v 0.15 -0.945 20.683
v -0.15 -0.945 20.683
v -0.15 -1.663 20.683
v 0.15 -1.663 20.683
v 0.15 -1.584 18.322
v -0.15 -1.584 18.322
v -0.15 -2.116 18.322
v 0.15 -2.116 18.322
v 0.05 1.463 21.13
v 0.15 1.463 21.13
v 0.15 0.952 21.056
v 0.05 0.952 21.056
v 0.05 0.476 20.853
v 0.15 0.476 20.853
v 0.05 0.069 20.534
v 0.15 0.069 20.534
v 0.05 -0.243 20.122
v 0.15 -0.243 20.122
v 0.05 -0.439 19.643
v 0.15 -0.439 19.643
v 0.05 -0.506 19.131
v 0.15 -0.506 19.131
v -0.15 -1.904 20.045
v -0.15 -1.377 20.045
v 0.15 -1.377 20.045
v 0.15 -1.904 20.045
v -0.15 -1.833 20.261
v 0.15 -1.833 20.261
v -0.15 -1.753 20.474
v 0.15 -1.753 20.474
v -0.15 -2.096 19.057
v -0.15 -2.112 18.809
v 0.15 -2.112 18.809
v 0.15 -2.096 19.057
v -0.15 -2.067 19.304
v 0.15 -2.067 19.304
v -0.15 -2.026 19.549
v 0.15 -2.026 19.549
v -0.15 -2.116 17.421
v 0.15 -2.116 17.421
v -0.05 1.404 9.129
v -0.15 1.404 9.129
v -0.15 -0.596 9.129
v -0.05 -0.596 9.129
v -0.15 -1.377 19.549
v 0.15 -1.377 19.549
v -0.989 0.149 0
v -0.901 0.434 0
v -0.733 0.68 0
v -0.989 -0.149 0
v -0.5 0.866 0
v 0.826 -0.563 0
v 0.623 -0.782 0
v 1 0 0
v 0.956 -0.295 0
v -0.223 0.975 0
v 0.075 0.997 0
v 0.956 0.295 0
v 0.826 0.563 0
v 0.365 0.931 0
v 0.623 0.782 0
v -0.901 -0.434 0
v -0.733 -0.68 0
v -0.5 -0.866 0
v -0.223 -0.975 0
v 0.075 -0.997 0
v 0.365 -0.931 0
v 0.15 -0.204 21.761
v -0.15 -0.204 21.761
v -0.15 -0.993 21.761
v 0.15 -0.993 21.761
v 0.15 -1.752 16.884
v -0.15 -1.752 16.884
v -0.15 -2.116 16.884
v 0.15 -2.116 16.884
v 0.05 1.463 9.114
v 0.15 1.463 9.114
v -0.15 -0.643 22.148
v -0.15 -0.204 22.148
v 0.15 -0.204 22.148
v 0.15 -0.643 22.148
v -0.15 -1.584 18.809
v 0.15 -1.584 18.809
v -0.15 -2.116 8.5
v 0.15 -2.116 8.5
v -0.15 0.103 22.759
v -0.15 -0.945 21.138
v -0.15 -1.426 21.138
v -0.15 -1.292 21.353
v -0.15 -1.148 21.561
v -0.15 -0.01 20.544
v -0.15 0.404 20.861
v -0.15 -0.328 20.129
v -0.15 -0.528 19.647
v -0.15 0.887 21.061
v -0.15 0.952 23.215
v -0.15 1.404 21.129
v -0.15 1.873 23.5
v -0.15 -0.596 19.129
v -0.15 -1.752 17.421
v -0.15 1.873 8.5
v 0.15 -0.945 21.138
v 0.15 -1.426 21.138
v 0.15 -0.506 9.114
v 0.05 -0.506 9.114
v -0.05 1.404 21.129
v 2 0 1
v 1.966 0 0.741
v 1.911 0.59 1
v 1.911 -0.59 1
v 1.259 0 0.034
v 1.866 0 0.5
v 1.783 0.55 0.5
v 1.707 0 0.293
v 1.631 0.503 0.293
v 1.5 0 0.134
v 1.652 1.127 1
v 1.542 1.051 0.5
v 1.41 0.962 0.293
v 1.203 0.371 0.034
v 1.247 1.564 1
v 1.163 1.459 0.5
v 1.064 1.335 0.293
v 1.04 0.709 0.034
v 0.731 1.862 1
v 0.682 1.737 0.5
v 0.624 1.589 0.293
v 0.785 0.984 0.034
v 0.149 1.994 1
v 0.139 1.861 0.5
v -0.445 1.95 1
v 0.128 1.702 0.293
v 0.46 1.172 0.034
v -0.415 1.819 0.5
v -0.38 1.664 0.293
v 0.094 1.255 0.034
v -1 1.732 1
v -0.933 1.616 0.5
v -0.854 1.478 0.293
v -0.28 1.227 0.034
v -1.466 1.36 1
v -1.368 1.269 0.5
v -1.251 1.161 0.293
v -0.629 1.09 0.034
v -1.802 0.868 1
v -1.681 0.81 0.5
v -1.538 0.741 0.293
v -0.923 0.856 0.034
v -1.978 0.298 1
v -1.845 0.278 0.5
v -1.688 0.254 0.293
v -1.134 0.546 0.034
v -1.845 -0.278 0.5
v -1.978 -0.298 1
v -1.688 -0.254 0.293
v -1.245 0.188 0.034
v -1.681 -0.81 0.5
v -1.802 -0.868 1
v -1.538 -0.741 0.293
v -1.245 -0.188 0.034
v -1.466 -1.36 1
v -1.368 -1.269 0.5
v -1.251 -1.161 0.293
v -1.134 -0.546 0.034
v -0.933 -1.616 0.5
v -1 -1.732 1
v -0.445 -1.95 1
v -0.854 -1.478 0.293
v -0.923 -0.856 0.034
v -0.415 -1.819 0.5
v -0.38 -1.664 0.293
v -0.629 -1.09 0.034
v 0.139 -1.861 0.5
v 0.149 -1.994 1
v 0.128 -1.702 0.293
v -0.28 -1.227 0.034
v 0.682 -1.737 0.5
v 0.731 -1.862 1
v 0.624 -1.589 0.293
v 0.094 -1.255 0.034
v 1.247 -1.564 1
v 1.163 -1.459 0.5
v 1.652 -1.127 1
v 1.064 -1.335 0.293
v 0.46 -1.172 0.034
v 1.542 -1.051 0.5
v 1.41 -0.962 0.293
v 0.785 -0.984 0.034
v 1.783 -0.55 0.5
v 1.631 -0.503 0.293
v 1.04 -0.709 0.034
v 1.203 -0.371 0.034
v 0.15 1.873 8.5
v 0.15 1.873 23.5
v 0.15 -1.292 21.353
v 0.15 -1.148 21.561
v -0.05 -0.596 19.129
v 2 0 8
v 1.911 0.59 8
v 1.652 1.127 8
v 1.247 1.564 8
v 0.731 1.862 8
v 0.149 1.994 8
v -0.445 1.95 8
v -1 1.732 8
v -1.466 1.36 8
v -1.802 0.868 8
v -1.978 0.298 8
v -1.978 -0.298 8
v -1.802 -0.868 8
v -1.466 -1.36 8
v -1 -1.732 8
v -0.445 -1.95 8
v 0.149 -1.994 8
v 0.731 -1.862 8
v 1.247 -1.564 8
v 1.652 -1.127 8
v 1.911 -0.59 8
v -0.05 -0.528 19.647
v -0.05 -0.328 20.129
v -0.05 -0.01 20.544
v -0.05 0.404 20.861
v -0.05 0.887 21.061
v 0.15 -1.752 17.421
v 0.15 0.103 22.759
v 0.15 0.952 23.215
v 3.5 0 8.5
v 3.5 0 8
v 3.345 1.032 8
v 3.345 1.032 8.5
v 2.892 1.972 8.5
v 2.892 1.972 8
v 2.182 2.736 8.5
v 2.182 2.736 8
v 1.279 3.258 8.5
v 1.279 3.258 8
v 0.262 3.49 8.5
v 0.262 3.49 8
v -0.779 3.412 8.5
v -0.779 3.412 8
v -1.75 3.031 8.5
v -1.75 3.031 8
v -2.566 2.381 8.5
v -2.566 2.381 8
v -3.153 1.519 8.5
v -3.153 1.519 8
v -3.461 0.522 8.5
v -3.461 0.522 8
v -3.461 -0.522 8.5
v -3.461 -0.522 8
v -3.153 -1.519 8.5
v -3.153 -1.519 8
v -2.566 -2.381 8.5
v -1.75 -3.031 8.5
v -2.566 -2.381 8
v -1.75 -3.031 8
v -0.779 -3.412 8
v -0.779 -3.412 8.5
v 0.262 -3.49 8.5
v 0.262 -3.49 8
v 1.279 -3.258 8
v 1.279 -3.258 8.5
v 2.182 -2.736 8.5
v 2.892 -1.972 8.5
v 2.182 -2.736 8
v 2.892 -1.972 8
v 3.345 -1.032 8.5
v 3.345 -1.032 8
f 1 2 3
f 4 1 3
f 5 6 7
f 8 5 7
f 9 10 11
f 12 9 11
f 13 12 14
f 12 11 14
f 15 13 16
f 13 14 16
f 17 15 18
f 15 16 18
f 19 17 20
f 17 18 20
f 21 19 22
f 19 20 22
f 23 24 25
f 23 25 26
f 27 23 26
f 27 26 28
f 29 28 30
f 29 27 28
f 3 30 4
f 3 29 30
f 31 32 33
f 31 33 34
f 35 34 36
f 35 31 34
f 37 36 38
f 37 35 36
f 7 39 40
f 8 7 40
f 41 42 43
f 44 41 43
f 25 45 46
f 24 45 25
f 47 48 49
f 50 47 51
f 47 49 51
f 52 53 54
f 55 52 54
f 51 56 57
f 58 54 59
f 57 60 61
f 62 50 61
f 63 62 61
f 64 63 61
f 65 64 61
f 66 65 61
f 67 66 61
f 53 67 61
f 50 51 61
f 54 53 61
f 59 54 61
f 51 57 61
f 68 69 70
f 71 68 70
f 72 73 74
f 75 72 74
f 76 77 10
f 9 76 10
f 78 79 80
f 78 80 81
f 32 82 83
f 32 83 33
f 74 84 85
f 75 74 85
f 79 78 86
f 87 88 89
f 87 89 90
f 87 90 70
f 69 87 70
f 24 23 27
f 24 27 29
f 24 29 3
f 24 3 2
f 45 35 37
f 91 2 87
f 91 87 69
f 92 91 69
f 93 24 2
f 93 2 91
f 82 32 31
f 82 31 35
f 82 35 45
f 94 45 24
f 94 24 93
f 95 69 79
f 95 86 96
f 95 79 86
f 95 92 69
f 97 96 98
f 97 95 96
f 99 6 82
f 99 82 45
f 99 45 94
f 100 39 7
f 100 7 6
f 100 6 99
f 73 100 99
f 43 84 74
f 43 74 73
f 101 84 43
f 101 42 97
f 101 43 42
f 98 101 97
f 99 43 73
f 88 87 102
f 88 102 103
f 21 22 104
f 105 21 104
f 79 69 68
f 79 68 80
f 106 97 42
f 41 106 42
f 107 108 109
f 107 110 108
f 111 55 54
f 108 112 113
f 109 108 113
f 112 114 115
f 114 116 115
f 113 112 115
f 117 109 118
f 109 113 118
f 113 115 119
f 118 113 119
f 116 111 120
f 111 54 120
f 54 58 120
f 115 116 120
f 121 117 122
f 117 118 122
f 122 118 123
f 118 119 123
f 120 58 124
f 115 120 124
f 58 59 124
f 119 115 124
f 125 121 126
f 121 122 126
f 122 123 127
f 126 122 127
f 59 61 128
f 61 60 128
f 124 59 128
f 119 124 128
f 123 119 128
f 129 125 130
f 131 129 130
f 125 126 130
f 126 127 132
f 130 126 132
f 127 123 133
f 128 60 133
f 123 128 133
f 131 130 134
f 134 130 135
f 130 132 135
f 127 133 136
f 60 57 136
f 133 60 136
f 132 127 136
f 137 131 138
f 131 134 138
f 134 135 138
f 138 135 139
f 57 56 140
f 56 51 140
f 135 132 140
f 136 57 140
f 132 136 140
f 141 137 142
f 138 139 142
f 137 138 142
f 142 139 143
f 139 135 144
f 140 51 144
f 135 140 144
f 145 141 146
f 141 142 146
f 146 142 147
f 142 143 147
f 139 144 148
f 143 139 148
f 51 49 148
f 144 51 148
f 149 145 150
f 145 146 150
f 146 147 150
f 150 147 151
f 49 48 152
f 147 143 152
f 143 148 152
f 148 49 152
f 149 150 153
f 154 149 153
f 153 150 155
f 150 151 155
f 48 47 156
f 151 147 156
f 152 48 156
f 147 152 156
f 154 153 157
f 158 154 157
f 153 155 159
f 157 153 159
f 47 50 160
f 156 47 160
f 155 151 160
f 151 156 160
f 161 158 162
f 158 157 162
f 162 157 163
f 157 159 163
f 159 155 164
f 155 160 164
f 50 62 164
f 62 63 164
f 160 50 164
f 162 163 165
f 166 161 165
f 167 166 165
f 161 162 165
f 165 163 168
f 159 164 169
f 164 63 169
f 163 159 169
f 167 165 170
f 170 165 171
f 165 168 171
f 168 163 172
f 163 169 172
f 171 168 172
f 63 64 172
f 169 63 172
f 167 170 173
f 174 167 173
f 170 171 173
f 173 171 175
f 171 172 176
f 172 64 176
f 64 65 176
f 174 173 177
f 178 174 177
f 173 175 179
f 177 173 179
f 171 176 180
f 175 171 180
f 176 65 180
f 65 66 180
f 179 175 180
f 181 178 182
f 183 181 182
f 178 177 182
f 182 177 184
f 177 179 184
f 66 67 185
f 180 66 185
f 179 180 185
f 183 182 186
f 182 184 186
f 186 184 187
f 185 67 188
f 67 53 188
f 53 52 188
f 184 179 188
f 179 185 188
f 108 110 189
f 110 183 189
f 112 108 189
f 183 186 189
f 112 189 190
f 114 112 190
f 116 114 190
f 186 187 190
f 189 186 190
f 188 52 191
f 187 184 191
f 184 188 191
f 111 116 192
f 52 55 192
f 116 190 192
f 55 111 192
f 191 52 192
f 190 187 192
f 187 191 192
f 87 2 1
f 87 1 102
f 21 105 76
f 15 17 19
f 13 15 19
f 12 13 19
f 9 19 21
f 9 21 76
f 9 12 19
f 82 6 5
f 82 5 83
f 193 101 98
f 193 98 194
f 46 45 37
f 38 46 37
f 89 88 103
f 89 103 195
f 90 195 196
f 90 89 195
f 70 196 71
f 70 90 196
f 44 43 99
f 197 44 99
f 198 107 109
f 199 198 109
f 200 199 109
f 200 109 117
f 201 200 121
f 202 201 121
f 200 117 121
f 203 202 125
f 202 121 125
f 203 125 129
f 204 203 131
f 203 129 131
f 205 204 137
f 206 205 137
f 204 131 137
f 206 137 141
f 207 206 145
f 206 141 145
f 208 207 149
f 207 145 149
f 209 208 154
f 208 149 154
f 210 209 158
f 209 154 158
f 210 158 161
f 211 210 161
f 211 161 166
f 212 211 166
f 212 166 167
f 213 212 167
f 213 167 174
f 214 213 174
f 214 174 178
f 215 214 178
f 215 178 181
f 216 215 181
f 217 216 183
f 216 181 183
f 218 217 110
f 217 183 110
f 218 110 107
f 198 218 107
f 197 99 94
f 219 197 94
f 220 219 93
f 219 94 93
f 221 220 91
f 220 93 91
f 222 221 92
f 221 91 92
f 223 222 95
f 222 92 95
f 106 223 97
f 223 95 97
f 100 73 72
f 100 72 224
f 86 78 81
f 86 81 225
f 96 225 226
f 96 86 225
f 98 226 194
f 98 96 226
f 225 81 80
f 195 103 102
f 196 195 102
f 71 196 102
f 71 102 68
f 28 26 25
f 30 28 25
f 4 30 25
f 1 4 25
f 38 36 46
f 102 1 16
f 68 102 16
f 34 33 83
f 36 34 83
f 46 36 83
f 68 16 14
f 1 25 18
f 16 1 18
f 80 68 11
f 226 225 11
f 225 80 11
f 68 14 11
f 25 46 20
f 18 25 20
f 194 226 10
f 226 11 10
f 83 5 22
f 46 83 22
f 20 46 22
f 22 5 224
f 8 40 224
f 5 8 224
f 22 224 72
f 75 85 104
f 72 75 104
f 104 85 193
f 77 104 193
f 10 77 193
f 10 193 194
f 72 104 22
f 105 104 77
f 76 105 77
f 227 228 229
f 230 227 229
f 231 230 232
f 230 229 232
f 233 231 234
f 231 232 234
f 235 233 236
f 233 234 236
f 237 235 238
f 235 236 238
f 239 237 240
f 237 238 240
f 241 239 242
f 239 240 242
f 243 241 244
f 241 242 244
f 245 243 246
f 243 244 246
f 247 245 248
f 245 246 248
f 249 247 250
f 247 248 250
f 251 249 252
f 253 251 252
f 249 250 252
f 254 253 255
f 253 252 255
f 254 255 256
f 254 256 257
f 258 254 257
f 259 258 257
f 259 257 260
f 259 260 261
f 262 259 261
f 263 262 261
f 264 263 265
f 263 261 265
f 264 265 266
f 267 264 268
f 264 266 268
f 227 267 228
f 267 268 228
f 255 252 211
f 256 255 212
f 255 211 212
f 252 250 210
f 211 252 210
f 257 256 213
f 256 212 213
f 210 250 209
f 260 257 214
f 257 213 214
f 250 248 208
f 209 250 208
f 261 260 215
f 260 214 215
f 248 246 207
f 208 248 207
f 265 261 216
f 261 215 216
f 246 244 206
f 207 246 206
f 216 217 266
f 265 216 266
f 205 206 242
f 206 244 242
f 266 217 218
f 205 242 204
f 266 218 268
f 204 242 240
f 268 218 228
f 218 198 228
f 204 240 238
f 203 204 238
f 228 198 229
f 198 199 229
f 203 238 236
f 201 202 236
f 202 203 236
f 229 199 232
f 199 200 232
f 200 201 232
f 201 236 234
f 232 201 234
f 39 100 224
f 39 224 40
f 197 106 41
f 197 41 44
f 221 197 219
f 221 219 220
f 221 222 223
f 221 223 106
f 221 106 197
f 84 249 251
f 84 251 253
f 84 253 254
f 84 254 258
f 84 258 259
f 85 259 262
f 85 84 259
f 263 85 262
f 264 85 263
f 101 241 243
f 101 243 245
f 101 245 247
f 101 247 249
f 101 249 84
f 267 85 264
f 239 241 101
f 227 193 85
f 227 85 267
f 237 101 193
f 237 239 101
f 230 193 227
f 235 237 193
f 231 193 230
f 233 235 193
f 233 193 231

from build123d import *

# Parameters (mm, degrees)
F0_R        = 2
F1_DEPTH    = 8
F2_R        = 3.5
F2_R_2      = 2
F3_DEPTH    = 0.5
F4_W        = 0.3
F4_H        = 3.9893038338
F5_DEPTH    = 15
F6_T1_DEPTH = 24.7839198555
F7_R        = 1
F8_W        = 1.6560796648
F8_H        = 0.4959646612
F8_W_2      = 1.2781426776
F8_H_2      = 0.4874281585
F8_W_3      = 1.2889747159
F8_H_3      = 0.4549305886
F8_W_4      = 0.7887214828
F8_H_4      = 0.3866125997
F8_W_5      = 1.2771316105
F8_H_5      = 0.5377400666
F9_DEPTH    = 0.3
F11_DEPTH   = 0.1
F13_DEPTH   = 0.1


# Not quite as in the source:
# - a fillet or chamfer that OpenCascade refuses, or shapes differently, is made with other operations: its cross-section is extruded or revolved along the edge and cut away or added


with BuildPart() as f1:
    # F0 (on Top) → F1 (new body)
    with BuildSketch(Plane.XY):
        Circle(F0_R)
    extrude(amount=F1_DEPTH)

    # F2 (on face) → F3 (join)
    with BuildSketch(Plane.XY.offset(8)):
        Circle(F2_R)
        Circle(F2_R_2, mode=Mode.SUBTRACT)
        Circle(F2_R_2)
    extrude(amount=F3_DEPTH)

    # F4 (on face) → F5 (join)
    with BuildSketch(Plane.XY.offset(8.5)):
        with Locations((0, -0.1216841047)):
            Rectangle(F4_W, F4_H)
    extrude(amount=F5_DEPTH)

    # F6: fillet of radius 5 on 1 edges, made by hand

    # F6_s2 → F6_t1 (cut)
    with BuildSketch(Plane.YZ.offset(-12.3919599278)):
        with BuildLine():
            ThreePointArc((-2.1163360216, 18.6032160289), (-0.9927700034, 21.7612628279), (1.8729678122, 23.5))
            Line((1.8729678122, 23.5), (-2.1163360216, 23.5))
            Line((-2.1163360216, 23.5), (-2.1163360216, 18.6032160289))
        make_face()
    extrude(amount=F6_T1_DEPTH, mode=Mode.SUBTRACT)

    # F7
    f7_edges = [f1.edges().sort_by_distance(p)[0] for p in [
        (-2, 0, 0),
    ]]
    fillet(f7_edges, radius=F7_R)

    # F8 (on face) → F9 (cut)
    with BuildSketch(Plane(origin=(-0.15, 0, 0), x_dir=(0, -1, 0), z_dir=(-1, 0, 0))):
        with Locations((2.2049986292, 19.7972180322)):
            Rectangle(F8_W, F8_H)
        with Locations((2.2229513852, 18.5654982924)):
            Rectangle(F8_W_2, F8_H_2)
        with Locations((1.5892958909, 20.9105657414)):
            Rectangle(F8_W_3, F8_H_3)
        with Locations((0.598409262, 21.9545691277)):
            Rectangle(F8_W_4, F8_H_4)
        with Locations((2.3904092959, 17.1525618061)):
            Rectangle(F8_W_5, F8_H_5)
    extrude(amount=-F9_DEPTH, mode=Mode.SUBTRACT)

    # F10 (on face) → F11 (cut)
    with BuildSketch(Plane(origin=(-0.15, 0, 0), x_dir=(0, -1, 0), z_dir=(-1, 0, 0))):
        with BuildLine():
            Line((-1.4041818934, 21.1293072328), (-1.4041818934, 9.1293072328))
            Line((-1.4041818934, 9.1293072328), (0.5958181066, 9.1293072328))
            Line((0.5958181066, 9.1293072328), (0.5958181066, 19.1293072328))
            ThreePointArc((0.5958181066, 19.1293072328), (0.010031669, 20.5435207952), (-1.4041818934, 21.1293072328))
        make_face()
    extrude(amount=-F11_DEPTH, mode=Mode.SUBTRACT)

    # F12 (on face) → F13 (cut)
    with BuildSketch(Plane.YZ.offset(0.15)):
        with BuildLine():
            Line((-0.5063290591, 9.1143995523), (1.4634948457, 9.1143995523))
            Line((1.4634948457, 9.1143995523), (1.4634948457, 21.1303744976))
            ThreePointArc((1.4634948457, 21.1303744976), (0.06882846, 20.5341063118), (-0.5063290591, 19.1306021597))
            Line((-0.5063290591, 19.1306021597), (-0.5063290591, 9.1143995523))
        make_face()
    extrude(amount=-F13_DEPTH, mode=Mode.SUBTRACT)


solid = f1.part
